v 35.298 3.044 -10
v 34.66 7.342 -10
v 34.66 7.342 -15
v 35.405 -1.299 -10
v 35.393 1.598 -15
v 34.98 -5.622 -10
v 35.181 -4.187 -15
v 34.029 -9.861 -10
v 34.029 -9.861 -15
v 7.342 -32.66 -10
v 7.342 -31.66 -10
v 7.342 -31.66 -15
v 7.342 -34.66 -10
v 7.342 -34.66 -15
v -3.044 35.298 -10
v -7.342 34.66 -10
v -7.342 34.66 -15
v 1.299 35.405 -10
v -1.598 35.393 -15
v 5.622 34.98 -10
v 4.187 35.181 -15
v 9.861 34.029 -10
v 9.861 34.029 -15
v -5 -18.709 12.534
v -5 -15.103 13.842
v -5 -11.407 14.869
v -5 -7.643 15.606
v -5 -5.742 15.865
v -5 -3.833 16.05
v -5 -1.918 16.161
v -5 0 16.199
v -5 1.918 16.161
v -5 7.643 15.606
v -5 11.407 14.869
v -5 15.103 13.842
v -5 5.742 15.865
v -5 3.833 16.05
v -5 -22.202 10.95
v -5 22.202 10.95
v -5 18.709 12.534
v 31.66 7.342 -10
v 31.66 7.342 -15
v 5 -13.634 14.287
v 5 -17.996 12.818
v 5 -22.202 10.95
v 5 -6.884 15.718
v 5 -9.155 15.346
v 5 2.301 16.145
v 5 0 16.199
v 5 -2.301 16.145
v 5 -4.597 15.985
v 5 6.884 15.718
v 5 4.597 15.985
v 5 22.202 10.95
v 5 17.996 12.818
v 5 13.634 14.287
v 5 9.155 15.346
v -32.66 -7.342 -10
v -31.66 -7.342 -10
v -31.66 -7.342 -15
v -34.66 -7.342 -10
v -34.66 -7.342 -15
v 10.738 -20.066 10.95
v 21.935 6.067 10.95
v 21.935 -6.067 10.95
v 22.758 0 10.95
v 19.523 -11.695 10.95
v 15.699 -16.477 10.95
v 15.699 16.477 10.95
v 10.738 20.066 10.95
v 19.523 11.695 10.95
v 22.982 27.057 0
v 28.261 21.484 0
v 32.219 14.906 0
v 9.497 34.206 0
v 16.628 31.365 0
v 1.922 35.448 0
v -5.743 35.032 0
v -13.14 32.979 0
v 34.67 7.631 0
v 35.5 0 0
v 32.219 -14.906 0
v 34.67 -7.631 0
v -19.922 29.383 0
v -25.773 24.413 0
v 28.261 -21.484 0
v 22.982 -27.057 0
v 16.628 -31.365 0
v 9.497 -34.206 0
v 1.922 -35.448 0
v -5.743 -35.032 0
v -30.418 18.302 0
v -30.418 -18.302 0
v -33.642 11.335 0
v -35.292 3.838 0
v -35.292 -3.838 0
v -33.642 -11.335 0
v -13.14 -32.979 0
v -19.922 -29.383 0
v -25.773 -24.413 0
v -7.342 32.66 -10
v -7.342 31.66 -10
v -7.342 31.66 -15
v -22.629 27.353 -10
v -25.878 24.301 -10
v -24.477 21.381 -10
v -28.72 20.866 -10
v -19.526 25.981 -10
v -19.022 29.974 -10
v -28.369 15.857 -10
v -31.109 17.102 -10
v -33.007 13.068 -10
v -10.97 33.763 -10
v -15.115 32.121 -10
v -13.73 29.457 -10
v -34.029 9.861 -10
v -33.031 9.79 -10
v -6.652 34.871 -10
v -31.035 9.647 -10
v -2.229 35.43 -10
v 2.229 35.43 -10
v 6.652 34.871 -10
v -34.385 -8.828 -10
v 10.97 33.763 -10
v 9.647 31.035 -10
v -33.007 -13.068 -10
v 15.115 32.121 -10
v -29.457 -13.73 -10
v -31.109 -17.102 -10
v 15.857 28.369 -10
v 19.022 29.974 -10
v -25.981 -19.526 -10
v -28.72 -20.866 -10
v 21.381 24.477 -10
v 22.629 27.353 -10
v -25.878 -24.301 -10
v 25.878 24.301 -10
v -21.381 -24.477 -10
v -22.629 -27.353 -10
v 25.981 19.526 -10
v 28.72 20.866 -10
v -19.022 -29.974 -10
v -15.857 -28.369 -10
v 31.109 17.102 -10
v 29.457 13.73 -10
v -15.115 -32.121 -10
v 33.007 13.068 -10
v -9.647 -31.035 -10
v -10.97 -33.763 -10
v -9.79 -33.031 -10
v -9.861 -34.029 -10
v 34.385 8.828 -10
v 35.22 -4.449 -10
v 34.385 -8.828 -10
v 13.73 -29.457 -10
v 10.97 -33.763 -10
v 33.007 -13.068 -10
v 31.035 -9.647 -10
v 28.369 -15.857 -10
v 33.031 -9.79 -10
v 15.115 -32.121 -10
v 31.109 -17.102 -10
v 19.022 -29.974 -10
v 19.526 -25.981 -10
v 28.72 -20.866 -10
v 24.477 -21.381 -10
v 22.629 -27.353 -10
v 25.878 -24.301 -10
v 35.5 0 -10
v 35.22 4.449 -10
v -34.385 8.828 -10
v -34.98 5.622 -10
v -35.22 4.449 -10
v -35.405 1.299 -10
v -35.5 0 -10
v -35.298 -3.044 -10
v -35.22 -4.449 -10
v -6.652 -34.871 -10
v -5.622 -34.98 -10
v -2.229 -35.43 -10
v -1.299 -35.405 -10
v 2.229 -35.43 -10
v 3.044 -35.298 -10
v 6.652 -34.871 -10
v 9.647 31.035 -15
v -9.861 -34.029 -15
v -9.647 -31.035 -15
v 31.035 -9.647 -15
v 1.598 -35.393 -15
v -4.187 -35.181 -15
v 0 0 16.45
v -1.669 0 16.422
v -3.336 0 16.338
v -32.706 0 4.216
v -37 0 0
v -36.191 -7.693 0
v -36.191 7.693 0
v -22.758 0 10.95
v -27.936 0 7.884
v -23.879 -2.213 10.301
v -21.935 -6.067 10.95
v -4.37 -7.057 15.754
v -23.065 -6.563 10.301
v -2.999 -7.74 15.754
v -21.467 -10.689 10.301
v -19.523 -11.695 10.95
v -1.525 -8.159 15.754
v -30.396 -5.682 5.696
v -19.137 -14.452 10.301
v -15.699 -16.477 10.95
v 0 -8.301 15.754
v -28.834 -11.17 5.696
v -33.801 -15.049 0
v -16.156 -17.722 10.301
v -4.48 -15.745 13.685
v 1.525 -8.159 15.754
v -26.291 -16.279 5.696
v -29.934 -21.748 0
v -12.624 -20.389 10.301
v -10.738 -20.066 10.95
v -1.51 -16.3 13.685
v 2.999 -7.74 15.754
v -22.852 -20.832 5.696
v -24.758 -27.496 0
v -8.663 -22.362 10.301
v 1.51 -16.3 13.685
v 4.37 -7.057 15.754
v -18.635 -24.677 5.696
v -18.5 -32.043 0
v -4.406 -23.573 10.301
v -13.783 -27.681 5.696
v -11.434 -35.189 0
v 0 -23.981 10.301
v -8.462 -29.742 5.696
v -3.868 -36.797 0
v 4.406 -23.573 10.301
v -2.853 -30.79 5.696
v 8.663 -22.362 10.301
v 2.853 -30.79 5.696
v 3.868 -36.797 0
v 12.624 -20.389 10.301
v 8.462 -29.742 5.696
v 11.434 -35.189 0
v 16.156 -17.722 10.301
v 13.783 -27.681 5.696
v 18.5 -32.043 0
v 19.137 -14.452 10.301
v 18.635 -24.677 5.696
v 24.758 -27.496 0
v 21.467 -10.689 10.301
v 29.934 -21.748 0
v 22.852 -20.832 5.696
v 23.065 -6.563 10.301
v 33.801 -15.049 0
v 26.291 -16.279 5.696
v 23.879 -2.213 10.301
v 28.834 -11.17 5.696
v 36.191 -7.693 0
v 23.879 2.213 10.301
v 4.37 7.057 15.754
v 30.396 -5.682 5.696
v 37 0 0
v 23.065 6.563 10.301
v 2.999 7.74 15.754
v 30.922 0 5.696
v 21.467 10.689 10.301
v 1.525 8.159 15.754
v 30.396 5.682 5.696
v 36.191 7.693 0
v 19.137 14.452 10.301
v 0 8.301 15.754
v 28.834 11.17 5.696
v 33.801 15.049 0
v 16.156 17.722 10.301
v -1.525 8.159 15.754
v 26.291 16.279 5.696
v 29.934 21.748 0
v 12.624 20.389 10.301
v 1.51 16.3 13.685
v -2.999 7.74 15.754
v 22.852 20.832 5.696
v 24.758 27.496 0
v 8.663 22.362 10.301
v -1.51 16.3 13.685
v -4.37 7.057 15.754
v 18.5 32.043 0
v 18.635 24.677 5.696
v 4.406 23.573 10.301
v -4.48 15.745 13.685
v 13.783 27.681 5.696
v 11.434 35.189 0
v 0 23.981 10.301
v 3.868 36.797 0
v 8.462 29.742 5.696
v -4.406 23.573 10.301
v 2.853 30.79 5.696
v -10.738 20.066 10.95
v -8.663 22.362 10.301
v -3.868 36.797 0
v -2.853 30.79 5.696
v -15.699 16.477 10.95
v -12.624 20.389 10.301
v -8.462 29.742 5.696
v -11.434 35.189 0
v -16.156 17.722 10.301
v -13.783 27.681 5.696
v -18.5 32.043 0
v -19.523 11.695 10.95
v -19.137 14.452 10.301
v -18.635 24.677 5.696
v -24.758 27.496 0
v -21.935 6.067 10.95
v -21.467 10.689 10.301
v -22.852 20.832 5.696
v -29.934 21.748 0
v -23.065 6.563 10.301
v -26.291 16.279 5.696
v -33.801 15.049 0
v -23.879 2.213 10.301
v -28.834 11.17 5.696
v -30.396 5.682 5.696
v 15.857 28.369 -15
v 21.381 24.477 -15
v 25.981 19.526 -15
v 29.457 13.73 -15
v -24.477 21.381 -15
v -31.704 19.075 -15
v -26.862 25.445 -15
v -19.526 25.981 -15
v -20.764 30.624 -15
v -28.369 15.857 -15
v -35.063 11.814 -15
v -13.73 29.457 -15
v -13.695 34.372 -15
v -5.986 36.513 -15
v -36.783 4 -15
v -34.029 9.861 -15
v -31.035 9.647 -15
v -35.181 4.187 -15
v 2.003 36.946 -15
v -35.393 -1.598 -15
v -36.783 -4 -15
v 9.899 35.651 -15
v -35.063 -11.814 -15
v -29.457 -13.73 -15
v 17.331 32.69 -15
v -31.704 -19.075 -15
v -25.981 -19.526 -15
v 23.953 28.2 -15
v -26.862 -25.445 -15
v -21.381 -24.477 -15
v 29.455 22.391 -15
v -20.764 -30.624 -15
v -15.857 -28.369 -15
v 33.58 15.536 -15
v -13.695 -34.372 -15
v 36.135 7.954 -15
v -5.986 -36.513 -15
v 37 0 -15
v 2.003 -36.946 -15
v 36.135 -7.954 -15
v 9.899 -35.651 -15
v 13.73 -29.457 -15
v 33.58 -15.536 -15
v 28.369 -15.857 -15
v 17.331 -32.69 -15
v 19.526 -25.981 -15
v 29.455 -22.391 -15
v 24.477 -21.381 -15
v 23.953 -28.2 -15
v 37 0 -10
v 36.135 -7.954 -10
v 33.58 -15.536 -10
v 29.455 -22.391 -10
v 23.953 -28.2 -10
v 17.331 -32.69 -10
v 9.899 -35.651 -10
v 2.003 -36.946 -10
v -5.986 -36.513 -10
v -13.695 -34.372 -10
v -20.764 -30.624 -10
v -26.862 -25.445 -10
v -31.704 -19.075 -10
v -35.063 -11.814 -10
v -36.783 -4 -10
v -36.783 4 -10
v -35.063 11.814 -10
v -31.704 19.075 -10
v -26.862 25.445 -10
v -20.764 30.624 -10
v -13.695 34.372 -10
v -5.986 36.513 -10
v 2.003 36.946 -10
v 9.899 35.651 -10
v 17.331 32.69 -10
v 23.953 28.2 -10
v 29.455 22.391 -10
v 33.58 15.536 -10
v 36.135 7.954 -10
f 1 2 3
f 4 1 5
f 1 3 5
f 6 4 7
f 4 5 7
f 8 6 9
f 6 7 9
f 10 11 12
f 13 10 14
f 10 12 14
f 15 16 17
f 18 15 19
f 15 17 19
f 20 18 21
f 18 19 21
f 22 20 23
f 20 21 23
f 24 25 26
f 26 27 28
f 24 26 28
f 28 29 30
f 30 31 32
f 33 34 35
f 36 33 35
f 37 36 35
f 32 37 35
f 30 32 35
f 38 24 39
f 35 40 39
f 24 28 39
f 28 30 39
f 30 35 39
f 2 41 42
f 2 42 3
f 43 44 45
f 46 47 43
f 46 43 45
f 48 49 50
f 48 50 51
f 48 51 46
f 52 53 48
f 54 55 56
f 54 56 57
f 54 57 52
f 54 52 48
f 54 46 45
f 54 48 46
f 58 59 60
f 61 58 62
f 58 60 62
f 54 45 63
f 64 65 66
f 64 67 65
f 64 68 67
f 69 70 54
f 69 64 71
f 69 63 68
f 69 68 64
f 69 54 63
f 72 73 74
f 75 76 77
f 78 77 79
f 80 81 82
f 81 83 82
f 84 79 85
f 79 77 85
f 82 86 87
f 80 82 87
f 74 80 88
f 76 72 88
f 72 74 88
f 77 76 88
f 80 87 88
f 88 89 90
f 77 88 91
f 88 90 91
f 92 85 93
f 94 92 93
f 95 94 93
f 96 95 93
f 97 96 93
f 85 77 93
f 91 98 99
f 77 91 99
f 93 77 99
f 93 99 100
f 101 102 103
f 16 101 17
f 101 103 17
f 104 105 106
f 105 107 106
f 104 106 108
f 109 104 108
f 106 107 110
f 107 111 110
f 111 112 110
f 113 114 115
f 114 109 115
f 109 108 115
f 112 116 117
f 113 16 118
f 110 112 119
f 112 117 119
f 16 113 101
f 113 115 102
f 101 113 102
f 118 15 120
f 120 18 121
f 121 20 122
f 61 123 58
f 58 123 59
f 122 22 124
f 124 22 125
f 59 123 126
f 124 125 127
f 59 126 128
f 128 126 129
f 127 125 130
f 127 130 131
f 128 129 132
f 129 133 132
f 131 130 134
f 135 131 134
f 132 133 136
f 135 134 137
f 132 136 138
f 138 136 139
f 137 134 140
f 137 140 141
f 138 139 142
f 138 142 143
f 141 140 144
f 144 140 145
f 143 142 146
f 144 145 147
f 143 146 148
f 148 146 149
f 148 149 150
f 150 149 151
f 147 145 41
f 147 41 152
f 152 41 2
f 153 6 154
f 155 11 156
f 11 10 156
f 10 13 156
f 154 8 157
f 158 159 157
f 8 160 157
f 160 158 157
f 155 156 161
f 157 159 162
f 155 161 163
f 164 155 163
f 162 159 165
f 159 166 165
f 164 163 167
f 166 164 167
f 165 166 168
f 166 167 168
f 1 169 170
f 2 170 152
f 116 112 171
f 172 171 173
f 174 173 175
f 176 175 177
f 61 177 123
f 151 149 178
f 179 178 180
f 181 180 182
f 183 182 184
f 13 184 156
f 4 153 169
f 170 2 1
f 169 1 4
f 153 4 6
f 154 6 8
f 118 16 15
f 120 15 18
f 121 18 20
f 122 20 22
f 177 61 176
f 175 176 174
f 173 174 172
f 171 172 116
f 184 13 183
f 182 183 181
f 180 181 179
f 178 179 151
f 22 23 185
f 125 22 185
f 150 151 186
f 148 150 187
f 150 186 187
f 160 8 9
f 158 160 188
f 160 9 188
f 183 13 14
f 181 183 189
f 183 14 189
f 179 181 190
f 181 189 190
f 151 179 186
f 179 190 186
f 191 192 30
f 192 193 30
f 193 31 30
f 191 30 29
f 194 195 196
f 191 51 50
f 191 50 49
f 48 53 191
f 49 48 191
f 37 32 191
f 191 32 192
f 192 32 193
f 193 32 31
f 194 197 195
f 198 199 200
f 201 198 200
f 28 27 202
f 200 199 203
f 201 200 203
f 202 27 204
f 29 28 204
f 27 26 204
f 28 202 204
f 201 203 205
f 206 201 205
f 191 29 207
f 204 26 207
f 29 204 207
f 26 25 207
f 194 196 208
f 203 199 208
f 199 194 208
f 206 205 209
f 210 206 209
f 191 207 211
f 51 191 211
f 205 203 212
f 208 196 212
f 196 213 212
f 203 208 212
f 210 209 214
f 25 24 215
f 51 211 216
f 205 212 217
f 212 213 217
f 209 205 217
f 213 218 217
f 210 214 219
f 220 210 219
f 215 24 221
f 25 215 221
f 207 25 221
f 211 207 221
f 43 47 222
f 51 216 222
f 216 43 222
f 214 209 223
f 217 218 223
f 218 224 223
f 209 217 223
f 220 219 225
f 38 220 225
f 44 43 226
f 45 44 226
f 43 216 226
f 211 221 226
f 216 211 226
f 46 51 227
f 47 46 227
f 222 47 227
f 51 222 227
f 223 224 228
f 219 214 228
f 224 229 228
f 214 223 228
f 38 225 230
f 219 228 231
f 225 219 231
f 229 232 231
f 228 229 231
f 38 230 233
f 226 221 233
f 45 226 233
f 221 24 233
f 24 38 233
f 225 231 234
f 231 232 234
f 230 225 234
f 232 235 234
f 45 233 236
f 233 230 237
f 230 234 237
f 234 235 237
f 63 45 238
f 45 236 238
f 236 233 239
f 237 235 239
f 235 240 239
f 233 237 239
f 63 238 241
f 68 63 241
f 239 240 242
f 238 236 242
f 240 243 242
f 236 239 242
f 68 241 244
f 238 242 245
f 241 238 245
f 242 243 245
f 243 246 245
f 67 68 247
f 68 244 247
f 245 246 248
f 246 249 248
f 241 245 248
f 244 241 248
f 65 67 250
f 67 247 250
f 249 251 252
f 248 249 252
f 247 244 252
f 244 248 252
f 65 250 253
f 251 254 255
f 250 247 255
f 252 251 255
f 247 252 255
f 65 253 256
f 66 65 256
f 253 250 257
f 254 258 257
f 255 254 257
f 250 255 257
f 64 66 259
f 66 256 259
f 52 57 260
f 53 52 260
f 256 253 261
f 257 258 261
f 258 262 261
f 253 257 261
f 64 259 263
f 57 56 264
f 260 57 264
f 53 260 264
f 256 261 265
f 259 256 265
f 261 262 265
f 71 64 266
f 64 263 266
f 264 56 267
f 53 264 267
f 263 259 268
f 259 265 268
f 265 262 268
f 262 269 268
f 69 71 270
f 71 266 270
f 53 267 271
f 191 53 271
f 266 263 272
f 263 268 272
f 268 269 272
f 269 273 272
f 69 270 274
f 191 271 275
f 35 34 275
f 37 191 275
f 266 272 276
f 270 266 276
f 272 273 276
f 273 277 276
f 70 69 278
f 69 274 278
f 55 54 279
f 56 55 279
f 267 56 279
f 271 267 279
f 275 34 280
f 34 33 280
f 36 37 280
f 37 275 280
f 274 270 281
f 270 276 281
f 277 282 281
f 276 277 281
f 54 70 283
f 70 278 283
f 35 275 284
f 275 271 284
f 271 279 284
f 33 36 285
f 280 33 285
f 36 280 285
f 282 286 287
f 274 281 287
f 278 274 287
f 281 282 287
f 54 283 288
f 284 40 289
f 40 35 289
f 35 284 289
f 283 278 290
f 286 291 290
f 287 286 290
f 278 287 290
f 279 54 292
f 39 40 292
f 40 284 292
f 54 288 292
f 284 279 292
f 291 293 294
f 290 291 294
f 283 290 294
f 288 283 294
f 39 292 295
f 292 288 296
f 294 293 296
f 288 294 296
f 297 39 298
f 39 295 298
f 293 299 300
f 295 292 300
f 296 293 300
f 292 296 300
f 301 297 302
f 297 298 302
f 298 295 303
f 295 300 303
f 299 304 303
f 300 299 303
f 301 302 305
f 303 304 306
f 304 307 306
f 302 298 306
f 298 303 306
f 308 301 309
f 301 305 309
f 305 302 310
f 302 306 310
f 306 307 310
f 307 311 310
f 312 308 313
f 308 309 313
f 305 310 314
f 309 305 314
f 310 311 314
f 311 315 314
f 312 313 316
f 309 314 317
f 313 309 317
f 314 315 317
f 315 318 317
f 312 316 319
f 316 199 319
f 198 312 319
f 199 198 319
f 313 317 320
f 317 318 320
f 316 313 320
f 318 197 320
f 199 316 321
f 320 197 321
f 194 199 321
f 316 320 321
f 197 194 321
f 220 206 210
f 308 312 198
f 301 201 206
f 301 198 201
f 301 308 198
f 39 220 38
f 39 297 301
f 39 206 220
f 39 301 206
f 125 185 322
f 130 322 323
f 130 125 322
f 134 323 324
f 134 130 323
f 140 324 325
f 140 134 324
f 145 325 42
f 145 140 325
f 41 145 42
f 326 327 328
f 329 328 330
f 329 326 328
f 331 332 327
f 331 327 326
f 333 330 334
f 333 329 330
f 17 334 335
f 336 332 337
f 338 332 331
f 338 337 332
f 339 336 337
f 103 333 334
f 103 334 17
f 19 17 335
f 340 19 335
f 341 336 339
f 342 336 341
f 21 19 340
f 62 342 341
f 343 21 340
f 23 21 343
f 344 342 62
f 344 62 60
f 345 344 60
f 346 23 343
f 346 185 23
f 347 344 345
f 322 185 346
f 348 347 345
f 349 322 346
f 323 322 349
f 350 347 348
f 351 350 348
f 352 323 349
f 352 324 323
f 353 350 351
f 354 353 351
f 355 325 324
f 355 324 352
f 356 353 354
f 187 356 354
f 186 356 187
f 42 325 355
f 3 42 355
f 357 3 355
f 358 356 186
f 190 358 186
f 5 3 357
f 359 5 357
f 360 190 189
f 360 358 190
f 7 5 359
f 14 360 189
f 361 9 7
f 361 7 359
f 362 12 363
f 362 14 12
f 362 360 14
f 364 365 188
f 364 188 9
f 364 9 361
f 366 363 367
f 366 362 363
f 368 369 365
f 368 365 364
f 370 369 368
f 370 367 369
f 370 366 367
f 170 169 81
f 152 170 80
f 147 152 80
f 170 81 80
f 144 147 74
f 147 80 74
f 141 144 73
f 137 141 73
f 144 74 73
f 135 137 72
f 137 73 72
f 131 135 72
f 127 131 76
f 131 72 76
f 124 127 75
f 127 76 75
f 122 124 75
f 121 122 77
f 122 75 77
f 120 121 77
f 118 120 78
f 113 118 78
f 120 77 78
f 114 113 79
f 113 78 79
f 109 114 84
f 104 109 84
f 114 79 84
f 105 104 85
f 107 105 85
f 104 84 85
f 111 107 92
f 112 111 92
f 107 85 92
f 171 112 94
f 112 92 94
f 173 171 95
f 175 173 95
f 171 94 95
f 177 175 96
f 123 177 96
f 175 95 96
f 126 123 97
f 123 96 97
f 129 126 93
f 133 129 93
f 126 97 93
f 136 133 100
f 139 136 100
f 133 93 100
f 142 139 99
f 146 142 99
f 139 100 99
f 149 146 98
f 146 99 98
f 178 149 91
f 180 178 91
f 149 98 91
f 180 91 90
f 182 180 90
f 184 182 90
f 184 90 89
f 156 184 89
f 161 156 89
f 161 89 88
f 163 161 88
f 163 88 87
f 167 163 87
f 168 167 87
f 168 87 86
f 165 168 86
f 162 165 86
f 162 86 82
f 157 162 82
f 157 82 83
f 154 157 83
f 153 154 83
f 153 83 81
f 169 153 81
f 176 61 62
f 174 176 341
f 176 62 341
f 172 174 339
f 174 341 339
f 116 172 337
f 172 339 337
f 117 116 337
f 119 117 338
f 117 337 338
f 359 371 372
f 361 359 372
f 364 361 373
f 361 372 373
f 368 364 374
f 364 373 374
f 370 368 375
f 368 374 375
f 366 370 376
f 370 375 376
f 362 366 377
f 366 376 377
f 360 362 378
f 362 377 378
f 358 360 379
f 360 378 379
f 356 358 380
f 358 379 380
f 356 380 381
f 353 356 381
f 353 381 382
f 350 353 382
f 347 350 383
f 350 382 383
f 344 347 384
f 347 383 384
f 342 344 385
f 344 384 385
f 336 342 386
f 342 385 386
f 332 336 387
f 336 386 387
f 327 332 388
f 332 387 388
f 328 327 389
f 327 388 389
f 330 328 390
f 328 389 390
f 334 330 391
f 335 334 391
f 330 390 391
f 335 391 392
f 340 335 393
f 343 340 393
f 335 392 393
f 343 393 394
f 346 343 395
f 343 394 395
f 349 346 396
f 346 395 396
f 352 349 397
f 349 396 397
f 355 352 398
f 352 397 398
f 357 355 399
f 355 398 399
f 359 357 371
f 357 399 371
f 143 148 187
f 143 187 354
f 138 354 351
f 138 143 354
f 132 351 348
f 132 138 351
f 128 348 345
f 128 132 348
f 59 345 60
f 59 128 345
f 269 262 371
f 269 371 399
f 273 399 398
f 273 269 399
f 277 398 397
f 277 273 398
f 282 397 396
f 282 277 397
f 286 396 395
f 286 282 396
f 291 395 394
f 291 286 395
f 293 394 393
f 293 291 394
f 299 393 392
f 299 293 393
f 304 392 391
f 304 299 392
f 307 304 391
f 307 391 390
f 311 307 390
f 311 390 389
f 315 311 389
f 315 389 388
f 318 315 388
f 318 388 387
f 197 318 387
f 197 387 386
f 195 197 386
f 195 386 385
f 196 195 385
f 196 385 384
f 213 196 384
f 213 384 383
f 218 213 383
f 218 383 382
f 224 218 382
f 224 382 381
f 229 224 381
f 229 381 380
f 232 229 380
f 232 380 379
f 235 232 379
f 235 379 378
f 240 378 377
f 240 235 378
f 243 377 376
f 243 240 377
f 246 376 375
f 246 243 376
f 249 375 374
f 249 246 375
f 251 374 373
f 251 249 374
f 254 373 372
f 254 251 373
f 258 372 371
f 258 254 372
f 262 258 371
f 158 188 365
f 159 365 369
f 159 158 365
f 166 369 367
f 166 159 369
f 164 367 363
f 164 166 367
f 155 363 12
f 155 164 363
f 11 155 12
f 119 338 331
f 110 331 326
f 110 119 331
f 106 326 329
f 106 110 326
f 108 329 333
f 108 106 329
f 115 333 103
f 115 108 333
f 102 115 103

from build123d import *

# Parameters (mm, degrees)
F5_R      = 37
F5_R_2    = 35.5
F6_DEPTH  = 10
F7_R      = 37
F7_R_2    = 32.5
F8_DEPTH  = 5
F4_W      = 20
F4_H      = 50
F9_DEPTH  = 5.5
F11_DEPTH = 10


with BuildPart() as f2:
    # F1 (on Front) → F2 (revolve)
    with BuildSketch(Plane.XZ):
        with BuildLine():
            Line((-37, 0), (0, 0))
            Line((0, 0), (0, 16.45))
            ThreePointArc((0, 16.45), (-20.2460026919, 12.152179307), (-37, 0))
        make_face()
    revolve(axis=Axis((0, 0, 8.225), (0, 0, 1)))

    # F5 (on Top) → F6 (join)
    with BuildSketch(Plane.XY):
        Circle(F5_R)
        Circle(F5_R_2, mode=Mode.SUBTRACT)
    extrude(amount=-F6_DEPTH)

    # F7 (on face) → F8 (join)
    with BuildSketch(Plane(origin=(0, 0, -10), x_dir=(1, 0, 0), z_dir=(0, 0, -1))):
        Circle(F7_R)
        Circle(F7_R_2, mode=Mode.SUBTRACT)
    extrude(amount=F8_DEPTH)

    # F4 (on offset) → F9 (cut)
    with BuildSketch(Plane.XY.offset(16.45)):
        with Locations((-15, 0)):
            Rectangle(F4_W, F4_H)
        with Locations((15, 0)):
            Rectangle(F4_W, F4_H)
    extrude(amount=-F9_DEPTH, mode=Mode.SUBTRACT)

    # F10 (on face) → F11 (cut)
    with BuildSketch(Plane(origin=(0, 0, -15), x_dir=(1, 0, 0), z_dir=(0, 0, -1))):
        with BuildLine():
            ThreePointArc((-31.0352267718, -9.6470046761), (-32.4780480974, -1.1943164501), (-31.6599461457, 7.3415127902))
            Line((-31.6599461457, 7.3415127902), (-34.6599461457, 7.3415127902))
            ThreePointArc((-34.6599461457, 7.3415127902), (-35.4051205032, -1.298891462), (-34.0288283151, -9.8614664413))
            Line((-34.0288283151, -9.8614664413), (-31.0352267718, -9.6470046761))
        make_face()
        with BuildLine():
            ThreePointArc((9.6470046761, -31.0352267718), (1.1943164501, -32.4780480974), (-7.3415127902, -31.6599461457))
            Line((-7.3415127902, -31.6599461457), (-7.3415127902, -34.6599461457))
            ThreePointArc((-7.3415127902, -34.6599461457), (1.298891462, -35.4051205032), (9.8614664413, -34.0288283151))
            Line((9.8614664413, -34.0288283151), (9.6470046761, -31.0352267718))
        make_face()
        with BuildLine():
            Line((34.0288283151, 9.8614664413), (31.0352267718, 9.6470046761))
            ThreePointArc((31.0352267718, 9.6470046761), (32.131720076, 4.8787872425), (32.5, 0))
            ThreePointArc((32.5, 0), (32.2893035674, -3.6947090727), (31.6599461457, -7.3415127902))
            Line((31.6599461457, -7.3415127902), (34.6599461457, -7.3415127902))
            ThreePointArc((34.6599461457, -7.3415127902), (35.4051205032, 1.298891462), (34.0288283151, 9.8614664413))
        make_face()
        with BuildLine():
            Line((-9.8614664413, 34.0288283151), (-9.6470046761, 31.0352267718))
            ThreePointArc((-9.6470046761, 31.0352267718), (-1.1943164501, 32.4780480974), (7.3415127902, 31.6599461457))
            Line((7.3415127902, 31.6599461457), (7.3415127902, 34.6599461457))
            ThreePointArc((7.3415127902, 34.6599461457), (-1.298891462, 35.4051205032), (-9.8614664413, 34.0288283151))
        make_face()
    extrude(amount=-F11_DEPTH, mode=Mode.SUBTRACT)


solid = f2.part
